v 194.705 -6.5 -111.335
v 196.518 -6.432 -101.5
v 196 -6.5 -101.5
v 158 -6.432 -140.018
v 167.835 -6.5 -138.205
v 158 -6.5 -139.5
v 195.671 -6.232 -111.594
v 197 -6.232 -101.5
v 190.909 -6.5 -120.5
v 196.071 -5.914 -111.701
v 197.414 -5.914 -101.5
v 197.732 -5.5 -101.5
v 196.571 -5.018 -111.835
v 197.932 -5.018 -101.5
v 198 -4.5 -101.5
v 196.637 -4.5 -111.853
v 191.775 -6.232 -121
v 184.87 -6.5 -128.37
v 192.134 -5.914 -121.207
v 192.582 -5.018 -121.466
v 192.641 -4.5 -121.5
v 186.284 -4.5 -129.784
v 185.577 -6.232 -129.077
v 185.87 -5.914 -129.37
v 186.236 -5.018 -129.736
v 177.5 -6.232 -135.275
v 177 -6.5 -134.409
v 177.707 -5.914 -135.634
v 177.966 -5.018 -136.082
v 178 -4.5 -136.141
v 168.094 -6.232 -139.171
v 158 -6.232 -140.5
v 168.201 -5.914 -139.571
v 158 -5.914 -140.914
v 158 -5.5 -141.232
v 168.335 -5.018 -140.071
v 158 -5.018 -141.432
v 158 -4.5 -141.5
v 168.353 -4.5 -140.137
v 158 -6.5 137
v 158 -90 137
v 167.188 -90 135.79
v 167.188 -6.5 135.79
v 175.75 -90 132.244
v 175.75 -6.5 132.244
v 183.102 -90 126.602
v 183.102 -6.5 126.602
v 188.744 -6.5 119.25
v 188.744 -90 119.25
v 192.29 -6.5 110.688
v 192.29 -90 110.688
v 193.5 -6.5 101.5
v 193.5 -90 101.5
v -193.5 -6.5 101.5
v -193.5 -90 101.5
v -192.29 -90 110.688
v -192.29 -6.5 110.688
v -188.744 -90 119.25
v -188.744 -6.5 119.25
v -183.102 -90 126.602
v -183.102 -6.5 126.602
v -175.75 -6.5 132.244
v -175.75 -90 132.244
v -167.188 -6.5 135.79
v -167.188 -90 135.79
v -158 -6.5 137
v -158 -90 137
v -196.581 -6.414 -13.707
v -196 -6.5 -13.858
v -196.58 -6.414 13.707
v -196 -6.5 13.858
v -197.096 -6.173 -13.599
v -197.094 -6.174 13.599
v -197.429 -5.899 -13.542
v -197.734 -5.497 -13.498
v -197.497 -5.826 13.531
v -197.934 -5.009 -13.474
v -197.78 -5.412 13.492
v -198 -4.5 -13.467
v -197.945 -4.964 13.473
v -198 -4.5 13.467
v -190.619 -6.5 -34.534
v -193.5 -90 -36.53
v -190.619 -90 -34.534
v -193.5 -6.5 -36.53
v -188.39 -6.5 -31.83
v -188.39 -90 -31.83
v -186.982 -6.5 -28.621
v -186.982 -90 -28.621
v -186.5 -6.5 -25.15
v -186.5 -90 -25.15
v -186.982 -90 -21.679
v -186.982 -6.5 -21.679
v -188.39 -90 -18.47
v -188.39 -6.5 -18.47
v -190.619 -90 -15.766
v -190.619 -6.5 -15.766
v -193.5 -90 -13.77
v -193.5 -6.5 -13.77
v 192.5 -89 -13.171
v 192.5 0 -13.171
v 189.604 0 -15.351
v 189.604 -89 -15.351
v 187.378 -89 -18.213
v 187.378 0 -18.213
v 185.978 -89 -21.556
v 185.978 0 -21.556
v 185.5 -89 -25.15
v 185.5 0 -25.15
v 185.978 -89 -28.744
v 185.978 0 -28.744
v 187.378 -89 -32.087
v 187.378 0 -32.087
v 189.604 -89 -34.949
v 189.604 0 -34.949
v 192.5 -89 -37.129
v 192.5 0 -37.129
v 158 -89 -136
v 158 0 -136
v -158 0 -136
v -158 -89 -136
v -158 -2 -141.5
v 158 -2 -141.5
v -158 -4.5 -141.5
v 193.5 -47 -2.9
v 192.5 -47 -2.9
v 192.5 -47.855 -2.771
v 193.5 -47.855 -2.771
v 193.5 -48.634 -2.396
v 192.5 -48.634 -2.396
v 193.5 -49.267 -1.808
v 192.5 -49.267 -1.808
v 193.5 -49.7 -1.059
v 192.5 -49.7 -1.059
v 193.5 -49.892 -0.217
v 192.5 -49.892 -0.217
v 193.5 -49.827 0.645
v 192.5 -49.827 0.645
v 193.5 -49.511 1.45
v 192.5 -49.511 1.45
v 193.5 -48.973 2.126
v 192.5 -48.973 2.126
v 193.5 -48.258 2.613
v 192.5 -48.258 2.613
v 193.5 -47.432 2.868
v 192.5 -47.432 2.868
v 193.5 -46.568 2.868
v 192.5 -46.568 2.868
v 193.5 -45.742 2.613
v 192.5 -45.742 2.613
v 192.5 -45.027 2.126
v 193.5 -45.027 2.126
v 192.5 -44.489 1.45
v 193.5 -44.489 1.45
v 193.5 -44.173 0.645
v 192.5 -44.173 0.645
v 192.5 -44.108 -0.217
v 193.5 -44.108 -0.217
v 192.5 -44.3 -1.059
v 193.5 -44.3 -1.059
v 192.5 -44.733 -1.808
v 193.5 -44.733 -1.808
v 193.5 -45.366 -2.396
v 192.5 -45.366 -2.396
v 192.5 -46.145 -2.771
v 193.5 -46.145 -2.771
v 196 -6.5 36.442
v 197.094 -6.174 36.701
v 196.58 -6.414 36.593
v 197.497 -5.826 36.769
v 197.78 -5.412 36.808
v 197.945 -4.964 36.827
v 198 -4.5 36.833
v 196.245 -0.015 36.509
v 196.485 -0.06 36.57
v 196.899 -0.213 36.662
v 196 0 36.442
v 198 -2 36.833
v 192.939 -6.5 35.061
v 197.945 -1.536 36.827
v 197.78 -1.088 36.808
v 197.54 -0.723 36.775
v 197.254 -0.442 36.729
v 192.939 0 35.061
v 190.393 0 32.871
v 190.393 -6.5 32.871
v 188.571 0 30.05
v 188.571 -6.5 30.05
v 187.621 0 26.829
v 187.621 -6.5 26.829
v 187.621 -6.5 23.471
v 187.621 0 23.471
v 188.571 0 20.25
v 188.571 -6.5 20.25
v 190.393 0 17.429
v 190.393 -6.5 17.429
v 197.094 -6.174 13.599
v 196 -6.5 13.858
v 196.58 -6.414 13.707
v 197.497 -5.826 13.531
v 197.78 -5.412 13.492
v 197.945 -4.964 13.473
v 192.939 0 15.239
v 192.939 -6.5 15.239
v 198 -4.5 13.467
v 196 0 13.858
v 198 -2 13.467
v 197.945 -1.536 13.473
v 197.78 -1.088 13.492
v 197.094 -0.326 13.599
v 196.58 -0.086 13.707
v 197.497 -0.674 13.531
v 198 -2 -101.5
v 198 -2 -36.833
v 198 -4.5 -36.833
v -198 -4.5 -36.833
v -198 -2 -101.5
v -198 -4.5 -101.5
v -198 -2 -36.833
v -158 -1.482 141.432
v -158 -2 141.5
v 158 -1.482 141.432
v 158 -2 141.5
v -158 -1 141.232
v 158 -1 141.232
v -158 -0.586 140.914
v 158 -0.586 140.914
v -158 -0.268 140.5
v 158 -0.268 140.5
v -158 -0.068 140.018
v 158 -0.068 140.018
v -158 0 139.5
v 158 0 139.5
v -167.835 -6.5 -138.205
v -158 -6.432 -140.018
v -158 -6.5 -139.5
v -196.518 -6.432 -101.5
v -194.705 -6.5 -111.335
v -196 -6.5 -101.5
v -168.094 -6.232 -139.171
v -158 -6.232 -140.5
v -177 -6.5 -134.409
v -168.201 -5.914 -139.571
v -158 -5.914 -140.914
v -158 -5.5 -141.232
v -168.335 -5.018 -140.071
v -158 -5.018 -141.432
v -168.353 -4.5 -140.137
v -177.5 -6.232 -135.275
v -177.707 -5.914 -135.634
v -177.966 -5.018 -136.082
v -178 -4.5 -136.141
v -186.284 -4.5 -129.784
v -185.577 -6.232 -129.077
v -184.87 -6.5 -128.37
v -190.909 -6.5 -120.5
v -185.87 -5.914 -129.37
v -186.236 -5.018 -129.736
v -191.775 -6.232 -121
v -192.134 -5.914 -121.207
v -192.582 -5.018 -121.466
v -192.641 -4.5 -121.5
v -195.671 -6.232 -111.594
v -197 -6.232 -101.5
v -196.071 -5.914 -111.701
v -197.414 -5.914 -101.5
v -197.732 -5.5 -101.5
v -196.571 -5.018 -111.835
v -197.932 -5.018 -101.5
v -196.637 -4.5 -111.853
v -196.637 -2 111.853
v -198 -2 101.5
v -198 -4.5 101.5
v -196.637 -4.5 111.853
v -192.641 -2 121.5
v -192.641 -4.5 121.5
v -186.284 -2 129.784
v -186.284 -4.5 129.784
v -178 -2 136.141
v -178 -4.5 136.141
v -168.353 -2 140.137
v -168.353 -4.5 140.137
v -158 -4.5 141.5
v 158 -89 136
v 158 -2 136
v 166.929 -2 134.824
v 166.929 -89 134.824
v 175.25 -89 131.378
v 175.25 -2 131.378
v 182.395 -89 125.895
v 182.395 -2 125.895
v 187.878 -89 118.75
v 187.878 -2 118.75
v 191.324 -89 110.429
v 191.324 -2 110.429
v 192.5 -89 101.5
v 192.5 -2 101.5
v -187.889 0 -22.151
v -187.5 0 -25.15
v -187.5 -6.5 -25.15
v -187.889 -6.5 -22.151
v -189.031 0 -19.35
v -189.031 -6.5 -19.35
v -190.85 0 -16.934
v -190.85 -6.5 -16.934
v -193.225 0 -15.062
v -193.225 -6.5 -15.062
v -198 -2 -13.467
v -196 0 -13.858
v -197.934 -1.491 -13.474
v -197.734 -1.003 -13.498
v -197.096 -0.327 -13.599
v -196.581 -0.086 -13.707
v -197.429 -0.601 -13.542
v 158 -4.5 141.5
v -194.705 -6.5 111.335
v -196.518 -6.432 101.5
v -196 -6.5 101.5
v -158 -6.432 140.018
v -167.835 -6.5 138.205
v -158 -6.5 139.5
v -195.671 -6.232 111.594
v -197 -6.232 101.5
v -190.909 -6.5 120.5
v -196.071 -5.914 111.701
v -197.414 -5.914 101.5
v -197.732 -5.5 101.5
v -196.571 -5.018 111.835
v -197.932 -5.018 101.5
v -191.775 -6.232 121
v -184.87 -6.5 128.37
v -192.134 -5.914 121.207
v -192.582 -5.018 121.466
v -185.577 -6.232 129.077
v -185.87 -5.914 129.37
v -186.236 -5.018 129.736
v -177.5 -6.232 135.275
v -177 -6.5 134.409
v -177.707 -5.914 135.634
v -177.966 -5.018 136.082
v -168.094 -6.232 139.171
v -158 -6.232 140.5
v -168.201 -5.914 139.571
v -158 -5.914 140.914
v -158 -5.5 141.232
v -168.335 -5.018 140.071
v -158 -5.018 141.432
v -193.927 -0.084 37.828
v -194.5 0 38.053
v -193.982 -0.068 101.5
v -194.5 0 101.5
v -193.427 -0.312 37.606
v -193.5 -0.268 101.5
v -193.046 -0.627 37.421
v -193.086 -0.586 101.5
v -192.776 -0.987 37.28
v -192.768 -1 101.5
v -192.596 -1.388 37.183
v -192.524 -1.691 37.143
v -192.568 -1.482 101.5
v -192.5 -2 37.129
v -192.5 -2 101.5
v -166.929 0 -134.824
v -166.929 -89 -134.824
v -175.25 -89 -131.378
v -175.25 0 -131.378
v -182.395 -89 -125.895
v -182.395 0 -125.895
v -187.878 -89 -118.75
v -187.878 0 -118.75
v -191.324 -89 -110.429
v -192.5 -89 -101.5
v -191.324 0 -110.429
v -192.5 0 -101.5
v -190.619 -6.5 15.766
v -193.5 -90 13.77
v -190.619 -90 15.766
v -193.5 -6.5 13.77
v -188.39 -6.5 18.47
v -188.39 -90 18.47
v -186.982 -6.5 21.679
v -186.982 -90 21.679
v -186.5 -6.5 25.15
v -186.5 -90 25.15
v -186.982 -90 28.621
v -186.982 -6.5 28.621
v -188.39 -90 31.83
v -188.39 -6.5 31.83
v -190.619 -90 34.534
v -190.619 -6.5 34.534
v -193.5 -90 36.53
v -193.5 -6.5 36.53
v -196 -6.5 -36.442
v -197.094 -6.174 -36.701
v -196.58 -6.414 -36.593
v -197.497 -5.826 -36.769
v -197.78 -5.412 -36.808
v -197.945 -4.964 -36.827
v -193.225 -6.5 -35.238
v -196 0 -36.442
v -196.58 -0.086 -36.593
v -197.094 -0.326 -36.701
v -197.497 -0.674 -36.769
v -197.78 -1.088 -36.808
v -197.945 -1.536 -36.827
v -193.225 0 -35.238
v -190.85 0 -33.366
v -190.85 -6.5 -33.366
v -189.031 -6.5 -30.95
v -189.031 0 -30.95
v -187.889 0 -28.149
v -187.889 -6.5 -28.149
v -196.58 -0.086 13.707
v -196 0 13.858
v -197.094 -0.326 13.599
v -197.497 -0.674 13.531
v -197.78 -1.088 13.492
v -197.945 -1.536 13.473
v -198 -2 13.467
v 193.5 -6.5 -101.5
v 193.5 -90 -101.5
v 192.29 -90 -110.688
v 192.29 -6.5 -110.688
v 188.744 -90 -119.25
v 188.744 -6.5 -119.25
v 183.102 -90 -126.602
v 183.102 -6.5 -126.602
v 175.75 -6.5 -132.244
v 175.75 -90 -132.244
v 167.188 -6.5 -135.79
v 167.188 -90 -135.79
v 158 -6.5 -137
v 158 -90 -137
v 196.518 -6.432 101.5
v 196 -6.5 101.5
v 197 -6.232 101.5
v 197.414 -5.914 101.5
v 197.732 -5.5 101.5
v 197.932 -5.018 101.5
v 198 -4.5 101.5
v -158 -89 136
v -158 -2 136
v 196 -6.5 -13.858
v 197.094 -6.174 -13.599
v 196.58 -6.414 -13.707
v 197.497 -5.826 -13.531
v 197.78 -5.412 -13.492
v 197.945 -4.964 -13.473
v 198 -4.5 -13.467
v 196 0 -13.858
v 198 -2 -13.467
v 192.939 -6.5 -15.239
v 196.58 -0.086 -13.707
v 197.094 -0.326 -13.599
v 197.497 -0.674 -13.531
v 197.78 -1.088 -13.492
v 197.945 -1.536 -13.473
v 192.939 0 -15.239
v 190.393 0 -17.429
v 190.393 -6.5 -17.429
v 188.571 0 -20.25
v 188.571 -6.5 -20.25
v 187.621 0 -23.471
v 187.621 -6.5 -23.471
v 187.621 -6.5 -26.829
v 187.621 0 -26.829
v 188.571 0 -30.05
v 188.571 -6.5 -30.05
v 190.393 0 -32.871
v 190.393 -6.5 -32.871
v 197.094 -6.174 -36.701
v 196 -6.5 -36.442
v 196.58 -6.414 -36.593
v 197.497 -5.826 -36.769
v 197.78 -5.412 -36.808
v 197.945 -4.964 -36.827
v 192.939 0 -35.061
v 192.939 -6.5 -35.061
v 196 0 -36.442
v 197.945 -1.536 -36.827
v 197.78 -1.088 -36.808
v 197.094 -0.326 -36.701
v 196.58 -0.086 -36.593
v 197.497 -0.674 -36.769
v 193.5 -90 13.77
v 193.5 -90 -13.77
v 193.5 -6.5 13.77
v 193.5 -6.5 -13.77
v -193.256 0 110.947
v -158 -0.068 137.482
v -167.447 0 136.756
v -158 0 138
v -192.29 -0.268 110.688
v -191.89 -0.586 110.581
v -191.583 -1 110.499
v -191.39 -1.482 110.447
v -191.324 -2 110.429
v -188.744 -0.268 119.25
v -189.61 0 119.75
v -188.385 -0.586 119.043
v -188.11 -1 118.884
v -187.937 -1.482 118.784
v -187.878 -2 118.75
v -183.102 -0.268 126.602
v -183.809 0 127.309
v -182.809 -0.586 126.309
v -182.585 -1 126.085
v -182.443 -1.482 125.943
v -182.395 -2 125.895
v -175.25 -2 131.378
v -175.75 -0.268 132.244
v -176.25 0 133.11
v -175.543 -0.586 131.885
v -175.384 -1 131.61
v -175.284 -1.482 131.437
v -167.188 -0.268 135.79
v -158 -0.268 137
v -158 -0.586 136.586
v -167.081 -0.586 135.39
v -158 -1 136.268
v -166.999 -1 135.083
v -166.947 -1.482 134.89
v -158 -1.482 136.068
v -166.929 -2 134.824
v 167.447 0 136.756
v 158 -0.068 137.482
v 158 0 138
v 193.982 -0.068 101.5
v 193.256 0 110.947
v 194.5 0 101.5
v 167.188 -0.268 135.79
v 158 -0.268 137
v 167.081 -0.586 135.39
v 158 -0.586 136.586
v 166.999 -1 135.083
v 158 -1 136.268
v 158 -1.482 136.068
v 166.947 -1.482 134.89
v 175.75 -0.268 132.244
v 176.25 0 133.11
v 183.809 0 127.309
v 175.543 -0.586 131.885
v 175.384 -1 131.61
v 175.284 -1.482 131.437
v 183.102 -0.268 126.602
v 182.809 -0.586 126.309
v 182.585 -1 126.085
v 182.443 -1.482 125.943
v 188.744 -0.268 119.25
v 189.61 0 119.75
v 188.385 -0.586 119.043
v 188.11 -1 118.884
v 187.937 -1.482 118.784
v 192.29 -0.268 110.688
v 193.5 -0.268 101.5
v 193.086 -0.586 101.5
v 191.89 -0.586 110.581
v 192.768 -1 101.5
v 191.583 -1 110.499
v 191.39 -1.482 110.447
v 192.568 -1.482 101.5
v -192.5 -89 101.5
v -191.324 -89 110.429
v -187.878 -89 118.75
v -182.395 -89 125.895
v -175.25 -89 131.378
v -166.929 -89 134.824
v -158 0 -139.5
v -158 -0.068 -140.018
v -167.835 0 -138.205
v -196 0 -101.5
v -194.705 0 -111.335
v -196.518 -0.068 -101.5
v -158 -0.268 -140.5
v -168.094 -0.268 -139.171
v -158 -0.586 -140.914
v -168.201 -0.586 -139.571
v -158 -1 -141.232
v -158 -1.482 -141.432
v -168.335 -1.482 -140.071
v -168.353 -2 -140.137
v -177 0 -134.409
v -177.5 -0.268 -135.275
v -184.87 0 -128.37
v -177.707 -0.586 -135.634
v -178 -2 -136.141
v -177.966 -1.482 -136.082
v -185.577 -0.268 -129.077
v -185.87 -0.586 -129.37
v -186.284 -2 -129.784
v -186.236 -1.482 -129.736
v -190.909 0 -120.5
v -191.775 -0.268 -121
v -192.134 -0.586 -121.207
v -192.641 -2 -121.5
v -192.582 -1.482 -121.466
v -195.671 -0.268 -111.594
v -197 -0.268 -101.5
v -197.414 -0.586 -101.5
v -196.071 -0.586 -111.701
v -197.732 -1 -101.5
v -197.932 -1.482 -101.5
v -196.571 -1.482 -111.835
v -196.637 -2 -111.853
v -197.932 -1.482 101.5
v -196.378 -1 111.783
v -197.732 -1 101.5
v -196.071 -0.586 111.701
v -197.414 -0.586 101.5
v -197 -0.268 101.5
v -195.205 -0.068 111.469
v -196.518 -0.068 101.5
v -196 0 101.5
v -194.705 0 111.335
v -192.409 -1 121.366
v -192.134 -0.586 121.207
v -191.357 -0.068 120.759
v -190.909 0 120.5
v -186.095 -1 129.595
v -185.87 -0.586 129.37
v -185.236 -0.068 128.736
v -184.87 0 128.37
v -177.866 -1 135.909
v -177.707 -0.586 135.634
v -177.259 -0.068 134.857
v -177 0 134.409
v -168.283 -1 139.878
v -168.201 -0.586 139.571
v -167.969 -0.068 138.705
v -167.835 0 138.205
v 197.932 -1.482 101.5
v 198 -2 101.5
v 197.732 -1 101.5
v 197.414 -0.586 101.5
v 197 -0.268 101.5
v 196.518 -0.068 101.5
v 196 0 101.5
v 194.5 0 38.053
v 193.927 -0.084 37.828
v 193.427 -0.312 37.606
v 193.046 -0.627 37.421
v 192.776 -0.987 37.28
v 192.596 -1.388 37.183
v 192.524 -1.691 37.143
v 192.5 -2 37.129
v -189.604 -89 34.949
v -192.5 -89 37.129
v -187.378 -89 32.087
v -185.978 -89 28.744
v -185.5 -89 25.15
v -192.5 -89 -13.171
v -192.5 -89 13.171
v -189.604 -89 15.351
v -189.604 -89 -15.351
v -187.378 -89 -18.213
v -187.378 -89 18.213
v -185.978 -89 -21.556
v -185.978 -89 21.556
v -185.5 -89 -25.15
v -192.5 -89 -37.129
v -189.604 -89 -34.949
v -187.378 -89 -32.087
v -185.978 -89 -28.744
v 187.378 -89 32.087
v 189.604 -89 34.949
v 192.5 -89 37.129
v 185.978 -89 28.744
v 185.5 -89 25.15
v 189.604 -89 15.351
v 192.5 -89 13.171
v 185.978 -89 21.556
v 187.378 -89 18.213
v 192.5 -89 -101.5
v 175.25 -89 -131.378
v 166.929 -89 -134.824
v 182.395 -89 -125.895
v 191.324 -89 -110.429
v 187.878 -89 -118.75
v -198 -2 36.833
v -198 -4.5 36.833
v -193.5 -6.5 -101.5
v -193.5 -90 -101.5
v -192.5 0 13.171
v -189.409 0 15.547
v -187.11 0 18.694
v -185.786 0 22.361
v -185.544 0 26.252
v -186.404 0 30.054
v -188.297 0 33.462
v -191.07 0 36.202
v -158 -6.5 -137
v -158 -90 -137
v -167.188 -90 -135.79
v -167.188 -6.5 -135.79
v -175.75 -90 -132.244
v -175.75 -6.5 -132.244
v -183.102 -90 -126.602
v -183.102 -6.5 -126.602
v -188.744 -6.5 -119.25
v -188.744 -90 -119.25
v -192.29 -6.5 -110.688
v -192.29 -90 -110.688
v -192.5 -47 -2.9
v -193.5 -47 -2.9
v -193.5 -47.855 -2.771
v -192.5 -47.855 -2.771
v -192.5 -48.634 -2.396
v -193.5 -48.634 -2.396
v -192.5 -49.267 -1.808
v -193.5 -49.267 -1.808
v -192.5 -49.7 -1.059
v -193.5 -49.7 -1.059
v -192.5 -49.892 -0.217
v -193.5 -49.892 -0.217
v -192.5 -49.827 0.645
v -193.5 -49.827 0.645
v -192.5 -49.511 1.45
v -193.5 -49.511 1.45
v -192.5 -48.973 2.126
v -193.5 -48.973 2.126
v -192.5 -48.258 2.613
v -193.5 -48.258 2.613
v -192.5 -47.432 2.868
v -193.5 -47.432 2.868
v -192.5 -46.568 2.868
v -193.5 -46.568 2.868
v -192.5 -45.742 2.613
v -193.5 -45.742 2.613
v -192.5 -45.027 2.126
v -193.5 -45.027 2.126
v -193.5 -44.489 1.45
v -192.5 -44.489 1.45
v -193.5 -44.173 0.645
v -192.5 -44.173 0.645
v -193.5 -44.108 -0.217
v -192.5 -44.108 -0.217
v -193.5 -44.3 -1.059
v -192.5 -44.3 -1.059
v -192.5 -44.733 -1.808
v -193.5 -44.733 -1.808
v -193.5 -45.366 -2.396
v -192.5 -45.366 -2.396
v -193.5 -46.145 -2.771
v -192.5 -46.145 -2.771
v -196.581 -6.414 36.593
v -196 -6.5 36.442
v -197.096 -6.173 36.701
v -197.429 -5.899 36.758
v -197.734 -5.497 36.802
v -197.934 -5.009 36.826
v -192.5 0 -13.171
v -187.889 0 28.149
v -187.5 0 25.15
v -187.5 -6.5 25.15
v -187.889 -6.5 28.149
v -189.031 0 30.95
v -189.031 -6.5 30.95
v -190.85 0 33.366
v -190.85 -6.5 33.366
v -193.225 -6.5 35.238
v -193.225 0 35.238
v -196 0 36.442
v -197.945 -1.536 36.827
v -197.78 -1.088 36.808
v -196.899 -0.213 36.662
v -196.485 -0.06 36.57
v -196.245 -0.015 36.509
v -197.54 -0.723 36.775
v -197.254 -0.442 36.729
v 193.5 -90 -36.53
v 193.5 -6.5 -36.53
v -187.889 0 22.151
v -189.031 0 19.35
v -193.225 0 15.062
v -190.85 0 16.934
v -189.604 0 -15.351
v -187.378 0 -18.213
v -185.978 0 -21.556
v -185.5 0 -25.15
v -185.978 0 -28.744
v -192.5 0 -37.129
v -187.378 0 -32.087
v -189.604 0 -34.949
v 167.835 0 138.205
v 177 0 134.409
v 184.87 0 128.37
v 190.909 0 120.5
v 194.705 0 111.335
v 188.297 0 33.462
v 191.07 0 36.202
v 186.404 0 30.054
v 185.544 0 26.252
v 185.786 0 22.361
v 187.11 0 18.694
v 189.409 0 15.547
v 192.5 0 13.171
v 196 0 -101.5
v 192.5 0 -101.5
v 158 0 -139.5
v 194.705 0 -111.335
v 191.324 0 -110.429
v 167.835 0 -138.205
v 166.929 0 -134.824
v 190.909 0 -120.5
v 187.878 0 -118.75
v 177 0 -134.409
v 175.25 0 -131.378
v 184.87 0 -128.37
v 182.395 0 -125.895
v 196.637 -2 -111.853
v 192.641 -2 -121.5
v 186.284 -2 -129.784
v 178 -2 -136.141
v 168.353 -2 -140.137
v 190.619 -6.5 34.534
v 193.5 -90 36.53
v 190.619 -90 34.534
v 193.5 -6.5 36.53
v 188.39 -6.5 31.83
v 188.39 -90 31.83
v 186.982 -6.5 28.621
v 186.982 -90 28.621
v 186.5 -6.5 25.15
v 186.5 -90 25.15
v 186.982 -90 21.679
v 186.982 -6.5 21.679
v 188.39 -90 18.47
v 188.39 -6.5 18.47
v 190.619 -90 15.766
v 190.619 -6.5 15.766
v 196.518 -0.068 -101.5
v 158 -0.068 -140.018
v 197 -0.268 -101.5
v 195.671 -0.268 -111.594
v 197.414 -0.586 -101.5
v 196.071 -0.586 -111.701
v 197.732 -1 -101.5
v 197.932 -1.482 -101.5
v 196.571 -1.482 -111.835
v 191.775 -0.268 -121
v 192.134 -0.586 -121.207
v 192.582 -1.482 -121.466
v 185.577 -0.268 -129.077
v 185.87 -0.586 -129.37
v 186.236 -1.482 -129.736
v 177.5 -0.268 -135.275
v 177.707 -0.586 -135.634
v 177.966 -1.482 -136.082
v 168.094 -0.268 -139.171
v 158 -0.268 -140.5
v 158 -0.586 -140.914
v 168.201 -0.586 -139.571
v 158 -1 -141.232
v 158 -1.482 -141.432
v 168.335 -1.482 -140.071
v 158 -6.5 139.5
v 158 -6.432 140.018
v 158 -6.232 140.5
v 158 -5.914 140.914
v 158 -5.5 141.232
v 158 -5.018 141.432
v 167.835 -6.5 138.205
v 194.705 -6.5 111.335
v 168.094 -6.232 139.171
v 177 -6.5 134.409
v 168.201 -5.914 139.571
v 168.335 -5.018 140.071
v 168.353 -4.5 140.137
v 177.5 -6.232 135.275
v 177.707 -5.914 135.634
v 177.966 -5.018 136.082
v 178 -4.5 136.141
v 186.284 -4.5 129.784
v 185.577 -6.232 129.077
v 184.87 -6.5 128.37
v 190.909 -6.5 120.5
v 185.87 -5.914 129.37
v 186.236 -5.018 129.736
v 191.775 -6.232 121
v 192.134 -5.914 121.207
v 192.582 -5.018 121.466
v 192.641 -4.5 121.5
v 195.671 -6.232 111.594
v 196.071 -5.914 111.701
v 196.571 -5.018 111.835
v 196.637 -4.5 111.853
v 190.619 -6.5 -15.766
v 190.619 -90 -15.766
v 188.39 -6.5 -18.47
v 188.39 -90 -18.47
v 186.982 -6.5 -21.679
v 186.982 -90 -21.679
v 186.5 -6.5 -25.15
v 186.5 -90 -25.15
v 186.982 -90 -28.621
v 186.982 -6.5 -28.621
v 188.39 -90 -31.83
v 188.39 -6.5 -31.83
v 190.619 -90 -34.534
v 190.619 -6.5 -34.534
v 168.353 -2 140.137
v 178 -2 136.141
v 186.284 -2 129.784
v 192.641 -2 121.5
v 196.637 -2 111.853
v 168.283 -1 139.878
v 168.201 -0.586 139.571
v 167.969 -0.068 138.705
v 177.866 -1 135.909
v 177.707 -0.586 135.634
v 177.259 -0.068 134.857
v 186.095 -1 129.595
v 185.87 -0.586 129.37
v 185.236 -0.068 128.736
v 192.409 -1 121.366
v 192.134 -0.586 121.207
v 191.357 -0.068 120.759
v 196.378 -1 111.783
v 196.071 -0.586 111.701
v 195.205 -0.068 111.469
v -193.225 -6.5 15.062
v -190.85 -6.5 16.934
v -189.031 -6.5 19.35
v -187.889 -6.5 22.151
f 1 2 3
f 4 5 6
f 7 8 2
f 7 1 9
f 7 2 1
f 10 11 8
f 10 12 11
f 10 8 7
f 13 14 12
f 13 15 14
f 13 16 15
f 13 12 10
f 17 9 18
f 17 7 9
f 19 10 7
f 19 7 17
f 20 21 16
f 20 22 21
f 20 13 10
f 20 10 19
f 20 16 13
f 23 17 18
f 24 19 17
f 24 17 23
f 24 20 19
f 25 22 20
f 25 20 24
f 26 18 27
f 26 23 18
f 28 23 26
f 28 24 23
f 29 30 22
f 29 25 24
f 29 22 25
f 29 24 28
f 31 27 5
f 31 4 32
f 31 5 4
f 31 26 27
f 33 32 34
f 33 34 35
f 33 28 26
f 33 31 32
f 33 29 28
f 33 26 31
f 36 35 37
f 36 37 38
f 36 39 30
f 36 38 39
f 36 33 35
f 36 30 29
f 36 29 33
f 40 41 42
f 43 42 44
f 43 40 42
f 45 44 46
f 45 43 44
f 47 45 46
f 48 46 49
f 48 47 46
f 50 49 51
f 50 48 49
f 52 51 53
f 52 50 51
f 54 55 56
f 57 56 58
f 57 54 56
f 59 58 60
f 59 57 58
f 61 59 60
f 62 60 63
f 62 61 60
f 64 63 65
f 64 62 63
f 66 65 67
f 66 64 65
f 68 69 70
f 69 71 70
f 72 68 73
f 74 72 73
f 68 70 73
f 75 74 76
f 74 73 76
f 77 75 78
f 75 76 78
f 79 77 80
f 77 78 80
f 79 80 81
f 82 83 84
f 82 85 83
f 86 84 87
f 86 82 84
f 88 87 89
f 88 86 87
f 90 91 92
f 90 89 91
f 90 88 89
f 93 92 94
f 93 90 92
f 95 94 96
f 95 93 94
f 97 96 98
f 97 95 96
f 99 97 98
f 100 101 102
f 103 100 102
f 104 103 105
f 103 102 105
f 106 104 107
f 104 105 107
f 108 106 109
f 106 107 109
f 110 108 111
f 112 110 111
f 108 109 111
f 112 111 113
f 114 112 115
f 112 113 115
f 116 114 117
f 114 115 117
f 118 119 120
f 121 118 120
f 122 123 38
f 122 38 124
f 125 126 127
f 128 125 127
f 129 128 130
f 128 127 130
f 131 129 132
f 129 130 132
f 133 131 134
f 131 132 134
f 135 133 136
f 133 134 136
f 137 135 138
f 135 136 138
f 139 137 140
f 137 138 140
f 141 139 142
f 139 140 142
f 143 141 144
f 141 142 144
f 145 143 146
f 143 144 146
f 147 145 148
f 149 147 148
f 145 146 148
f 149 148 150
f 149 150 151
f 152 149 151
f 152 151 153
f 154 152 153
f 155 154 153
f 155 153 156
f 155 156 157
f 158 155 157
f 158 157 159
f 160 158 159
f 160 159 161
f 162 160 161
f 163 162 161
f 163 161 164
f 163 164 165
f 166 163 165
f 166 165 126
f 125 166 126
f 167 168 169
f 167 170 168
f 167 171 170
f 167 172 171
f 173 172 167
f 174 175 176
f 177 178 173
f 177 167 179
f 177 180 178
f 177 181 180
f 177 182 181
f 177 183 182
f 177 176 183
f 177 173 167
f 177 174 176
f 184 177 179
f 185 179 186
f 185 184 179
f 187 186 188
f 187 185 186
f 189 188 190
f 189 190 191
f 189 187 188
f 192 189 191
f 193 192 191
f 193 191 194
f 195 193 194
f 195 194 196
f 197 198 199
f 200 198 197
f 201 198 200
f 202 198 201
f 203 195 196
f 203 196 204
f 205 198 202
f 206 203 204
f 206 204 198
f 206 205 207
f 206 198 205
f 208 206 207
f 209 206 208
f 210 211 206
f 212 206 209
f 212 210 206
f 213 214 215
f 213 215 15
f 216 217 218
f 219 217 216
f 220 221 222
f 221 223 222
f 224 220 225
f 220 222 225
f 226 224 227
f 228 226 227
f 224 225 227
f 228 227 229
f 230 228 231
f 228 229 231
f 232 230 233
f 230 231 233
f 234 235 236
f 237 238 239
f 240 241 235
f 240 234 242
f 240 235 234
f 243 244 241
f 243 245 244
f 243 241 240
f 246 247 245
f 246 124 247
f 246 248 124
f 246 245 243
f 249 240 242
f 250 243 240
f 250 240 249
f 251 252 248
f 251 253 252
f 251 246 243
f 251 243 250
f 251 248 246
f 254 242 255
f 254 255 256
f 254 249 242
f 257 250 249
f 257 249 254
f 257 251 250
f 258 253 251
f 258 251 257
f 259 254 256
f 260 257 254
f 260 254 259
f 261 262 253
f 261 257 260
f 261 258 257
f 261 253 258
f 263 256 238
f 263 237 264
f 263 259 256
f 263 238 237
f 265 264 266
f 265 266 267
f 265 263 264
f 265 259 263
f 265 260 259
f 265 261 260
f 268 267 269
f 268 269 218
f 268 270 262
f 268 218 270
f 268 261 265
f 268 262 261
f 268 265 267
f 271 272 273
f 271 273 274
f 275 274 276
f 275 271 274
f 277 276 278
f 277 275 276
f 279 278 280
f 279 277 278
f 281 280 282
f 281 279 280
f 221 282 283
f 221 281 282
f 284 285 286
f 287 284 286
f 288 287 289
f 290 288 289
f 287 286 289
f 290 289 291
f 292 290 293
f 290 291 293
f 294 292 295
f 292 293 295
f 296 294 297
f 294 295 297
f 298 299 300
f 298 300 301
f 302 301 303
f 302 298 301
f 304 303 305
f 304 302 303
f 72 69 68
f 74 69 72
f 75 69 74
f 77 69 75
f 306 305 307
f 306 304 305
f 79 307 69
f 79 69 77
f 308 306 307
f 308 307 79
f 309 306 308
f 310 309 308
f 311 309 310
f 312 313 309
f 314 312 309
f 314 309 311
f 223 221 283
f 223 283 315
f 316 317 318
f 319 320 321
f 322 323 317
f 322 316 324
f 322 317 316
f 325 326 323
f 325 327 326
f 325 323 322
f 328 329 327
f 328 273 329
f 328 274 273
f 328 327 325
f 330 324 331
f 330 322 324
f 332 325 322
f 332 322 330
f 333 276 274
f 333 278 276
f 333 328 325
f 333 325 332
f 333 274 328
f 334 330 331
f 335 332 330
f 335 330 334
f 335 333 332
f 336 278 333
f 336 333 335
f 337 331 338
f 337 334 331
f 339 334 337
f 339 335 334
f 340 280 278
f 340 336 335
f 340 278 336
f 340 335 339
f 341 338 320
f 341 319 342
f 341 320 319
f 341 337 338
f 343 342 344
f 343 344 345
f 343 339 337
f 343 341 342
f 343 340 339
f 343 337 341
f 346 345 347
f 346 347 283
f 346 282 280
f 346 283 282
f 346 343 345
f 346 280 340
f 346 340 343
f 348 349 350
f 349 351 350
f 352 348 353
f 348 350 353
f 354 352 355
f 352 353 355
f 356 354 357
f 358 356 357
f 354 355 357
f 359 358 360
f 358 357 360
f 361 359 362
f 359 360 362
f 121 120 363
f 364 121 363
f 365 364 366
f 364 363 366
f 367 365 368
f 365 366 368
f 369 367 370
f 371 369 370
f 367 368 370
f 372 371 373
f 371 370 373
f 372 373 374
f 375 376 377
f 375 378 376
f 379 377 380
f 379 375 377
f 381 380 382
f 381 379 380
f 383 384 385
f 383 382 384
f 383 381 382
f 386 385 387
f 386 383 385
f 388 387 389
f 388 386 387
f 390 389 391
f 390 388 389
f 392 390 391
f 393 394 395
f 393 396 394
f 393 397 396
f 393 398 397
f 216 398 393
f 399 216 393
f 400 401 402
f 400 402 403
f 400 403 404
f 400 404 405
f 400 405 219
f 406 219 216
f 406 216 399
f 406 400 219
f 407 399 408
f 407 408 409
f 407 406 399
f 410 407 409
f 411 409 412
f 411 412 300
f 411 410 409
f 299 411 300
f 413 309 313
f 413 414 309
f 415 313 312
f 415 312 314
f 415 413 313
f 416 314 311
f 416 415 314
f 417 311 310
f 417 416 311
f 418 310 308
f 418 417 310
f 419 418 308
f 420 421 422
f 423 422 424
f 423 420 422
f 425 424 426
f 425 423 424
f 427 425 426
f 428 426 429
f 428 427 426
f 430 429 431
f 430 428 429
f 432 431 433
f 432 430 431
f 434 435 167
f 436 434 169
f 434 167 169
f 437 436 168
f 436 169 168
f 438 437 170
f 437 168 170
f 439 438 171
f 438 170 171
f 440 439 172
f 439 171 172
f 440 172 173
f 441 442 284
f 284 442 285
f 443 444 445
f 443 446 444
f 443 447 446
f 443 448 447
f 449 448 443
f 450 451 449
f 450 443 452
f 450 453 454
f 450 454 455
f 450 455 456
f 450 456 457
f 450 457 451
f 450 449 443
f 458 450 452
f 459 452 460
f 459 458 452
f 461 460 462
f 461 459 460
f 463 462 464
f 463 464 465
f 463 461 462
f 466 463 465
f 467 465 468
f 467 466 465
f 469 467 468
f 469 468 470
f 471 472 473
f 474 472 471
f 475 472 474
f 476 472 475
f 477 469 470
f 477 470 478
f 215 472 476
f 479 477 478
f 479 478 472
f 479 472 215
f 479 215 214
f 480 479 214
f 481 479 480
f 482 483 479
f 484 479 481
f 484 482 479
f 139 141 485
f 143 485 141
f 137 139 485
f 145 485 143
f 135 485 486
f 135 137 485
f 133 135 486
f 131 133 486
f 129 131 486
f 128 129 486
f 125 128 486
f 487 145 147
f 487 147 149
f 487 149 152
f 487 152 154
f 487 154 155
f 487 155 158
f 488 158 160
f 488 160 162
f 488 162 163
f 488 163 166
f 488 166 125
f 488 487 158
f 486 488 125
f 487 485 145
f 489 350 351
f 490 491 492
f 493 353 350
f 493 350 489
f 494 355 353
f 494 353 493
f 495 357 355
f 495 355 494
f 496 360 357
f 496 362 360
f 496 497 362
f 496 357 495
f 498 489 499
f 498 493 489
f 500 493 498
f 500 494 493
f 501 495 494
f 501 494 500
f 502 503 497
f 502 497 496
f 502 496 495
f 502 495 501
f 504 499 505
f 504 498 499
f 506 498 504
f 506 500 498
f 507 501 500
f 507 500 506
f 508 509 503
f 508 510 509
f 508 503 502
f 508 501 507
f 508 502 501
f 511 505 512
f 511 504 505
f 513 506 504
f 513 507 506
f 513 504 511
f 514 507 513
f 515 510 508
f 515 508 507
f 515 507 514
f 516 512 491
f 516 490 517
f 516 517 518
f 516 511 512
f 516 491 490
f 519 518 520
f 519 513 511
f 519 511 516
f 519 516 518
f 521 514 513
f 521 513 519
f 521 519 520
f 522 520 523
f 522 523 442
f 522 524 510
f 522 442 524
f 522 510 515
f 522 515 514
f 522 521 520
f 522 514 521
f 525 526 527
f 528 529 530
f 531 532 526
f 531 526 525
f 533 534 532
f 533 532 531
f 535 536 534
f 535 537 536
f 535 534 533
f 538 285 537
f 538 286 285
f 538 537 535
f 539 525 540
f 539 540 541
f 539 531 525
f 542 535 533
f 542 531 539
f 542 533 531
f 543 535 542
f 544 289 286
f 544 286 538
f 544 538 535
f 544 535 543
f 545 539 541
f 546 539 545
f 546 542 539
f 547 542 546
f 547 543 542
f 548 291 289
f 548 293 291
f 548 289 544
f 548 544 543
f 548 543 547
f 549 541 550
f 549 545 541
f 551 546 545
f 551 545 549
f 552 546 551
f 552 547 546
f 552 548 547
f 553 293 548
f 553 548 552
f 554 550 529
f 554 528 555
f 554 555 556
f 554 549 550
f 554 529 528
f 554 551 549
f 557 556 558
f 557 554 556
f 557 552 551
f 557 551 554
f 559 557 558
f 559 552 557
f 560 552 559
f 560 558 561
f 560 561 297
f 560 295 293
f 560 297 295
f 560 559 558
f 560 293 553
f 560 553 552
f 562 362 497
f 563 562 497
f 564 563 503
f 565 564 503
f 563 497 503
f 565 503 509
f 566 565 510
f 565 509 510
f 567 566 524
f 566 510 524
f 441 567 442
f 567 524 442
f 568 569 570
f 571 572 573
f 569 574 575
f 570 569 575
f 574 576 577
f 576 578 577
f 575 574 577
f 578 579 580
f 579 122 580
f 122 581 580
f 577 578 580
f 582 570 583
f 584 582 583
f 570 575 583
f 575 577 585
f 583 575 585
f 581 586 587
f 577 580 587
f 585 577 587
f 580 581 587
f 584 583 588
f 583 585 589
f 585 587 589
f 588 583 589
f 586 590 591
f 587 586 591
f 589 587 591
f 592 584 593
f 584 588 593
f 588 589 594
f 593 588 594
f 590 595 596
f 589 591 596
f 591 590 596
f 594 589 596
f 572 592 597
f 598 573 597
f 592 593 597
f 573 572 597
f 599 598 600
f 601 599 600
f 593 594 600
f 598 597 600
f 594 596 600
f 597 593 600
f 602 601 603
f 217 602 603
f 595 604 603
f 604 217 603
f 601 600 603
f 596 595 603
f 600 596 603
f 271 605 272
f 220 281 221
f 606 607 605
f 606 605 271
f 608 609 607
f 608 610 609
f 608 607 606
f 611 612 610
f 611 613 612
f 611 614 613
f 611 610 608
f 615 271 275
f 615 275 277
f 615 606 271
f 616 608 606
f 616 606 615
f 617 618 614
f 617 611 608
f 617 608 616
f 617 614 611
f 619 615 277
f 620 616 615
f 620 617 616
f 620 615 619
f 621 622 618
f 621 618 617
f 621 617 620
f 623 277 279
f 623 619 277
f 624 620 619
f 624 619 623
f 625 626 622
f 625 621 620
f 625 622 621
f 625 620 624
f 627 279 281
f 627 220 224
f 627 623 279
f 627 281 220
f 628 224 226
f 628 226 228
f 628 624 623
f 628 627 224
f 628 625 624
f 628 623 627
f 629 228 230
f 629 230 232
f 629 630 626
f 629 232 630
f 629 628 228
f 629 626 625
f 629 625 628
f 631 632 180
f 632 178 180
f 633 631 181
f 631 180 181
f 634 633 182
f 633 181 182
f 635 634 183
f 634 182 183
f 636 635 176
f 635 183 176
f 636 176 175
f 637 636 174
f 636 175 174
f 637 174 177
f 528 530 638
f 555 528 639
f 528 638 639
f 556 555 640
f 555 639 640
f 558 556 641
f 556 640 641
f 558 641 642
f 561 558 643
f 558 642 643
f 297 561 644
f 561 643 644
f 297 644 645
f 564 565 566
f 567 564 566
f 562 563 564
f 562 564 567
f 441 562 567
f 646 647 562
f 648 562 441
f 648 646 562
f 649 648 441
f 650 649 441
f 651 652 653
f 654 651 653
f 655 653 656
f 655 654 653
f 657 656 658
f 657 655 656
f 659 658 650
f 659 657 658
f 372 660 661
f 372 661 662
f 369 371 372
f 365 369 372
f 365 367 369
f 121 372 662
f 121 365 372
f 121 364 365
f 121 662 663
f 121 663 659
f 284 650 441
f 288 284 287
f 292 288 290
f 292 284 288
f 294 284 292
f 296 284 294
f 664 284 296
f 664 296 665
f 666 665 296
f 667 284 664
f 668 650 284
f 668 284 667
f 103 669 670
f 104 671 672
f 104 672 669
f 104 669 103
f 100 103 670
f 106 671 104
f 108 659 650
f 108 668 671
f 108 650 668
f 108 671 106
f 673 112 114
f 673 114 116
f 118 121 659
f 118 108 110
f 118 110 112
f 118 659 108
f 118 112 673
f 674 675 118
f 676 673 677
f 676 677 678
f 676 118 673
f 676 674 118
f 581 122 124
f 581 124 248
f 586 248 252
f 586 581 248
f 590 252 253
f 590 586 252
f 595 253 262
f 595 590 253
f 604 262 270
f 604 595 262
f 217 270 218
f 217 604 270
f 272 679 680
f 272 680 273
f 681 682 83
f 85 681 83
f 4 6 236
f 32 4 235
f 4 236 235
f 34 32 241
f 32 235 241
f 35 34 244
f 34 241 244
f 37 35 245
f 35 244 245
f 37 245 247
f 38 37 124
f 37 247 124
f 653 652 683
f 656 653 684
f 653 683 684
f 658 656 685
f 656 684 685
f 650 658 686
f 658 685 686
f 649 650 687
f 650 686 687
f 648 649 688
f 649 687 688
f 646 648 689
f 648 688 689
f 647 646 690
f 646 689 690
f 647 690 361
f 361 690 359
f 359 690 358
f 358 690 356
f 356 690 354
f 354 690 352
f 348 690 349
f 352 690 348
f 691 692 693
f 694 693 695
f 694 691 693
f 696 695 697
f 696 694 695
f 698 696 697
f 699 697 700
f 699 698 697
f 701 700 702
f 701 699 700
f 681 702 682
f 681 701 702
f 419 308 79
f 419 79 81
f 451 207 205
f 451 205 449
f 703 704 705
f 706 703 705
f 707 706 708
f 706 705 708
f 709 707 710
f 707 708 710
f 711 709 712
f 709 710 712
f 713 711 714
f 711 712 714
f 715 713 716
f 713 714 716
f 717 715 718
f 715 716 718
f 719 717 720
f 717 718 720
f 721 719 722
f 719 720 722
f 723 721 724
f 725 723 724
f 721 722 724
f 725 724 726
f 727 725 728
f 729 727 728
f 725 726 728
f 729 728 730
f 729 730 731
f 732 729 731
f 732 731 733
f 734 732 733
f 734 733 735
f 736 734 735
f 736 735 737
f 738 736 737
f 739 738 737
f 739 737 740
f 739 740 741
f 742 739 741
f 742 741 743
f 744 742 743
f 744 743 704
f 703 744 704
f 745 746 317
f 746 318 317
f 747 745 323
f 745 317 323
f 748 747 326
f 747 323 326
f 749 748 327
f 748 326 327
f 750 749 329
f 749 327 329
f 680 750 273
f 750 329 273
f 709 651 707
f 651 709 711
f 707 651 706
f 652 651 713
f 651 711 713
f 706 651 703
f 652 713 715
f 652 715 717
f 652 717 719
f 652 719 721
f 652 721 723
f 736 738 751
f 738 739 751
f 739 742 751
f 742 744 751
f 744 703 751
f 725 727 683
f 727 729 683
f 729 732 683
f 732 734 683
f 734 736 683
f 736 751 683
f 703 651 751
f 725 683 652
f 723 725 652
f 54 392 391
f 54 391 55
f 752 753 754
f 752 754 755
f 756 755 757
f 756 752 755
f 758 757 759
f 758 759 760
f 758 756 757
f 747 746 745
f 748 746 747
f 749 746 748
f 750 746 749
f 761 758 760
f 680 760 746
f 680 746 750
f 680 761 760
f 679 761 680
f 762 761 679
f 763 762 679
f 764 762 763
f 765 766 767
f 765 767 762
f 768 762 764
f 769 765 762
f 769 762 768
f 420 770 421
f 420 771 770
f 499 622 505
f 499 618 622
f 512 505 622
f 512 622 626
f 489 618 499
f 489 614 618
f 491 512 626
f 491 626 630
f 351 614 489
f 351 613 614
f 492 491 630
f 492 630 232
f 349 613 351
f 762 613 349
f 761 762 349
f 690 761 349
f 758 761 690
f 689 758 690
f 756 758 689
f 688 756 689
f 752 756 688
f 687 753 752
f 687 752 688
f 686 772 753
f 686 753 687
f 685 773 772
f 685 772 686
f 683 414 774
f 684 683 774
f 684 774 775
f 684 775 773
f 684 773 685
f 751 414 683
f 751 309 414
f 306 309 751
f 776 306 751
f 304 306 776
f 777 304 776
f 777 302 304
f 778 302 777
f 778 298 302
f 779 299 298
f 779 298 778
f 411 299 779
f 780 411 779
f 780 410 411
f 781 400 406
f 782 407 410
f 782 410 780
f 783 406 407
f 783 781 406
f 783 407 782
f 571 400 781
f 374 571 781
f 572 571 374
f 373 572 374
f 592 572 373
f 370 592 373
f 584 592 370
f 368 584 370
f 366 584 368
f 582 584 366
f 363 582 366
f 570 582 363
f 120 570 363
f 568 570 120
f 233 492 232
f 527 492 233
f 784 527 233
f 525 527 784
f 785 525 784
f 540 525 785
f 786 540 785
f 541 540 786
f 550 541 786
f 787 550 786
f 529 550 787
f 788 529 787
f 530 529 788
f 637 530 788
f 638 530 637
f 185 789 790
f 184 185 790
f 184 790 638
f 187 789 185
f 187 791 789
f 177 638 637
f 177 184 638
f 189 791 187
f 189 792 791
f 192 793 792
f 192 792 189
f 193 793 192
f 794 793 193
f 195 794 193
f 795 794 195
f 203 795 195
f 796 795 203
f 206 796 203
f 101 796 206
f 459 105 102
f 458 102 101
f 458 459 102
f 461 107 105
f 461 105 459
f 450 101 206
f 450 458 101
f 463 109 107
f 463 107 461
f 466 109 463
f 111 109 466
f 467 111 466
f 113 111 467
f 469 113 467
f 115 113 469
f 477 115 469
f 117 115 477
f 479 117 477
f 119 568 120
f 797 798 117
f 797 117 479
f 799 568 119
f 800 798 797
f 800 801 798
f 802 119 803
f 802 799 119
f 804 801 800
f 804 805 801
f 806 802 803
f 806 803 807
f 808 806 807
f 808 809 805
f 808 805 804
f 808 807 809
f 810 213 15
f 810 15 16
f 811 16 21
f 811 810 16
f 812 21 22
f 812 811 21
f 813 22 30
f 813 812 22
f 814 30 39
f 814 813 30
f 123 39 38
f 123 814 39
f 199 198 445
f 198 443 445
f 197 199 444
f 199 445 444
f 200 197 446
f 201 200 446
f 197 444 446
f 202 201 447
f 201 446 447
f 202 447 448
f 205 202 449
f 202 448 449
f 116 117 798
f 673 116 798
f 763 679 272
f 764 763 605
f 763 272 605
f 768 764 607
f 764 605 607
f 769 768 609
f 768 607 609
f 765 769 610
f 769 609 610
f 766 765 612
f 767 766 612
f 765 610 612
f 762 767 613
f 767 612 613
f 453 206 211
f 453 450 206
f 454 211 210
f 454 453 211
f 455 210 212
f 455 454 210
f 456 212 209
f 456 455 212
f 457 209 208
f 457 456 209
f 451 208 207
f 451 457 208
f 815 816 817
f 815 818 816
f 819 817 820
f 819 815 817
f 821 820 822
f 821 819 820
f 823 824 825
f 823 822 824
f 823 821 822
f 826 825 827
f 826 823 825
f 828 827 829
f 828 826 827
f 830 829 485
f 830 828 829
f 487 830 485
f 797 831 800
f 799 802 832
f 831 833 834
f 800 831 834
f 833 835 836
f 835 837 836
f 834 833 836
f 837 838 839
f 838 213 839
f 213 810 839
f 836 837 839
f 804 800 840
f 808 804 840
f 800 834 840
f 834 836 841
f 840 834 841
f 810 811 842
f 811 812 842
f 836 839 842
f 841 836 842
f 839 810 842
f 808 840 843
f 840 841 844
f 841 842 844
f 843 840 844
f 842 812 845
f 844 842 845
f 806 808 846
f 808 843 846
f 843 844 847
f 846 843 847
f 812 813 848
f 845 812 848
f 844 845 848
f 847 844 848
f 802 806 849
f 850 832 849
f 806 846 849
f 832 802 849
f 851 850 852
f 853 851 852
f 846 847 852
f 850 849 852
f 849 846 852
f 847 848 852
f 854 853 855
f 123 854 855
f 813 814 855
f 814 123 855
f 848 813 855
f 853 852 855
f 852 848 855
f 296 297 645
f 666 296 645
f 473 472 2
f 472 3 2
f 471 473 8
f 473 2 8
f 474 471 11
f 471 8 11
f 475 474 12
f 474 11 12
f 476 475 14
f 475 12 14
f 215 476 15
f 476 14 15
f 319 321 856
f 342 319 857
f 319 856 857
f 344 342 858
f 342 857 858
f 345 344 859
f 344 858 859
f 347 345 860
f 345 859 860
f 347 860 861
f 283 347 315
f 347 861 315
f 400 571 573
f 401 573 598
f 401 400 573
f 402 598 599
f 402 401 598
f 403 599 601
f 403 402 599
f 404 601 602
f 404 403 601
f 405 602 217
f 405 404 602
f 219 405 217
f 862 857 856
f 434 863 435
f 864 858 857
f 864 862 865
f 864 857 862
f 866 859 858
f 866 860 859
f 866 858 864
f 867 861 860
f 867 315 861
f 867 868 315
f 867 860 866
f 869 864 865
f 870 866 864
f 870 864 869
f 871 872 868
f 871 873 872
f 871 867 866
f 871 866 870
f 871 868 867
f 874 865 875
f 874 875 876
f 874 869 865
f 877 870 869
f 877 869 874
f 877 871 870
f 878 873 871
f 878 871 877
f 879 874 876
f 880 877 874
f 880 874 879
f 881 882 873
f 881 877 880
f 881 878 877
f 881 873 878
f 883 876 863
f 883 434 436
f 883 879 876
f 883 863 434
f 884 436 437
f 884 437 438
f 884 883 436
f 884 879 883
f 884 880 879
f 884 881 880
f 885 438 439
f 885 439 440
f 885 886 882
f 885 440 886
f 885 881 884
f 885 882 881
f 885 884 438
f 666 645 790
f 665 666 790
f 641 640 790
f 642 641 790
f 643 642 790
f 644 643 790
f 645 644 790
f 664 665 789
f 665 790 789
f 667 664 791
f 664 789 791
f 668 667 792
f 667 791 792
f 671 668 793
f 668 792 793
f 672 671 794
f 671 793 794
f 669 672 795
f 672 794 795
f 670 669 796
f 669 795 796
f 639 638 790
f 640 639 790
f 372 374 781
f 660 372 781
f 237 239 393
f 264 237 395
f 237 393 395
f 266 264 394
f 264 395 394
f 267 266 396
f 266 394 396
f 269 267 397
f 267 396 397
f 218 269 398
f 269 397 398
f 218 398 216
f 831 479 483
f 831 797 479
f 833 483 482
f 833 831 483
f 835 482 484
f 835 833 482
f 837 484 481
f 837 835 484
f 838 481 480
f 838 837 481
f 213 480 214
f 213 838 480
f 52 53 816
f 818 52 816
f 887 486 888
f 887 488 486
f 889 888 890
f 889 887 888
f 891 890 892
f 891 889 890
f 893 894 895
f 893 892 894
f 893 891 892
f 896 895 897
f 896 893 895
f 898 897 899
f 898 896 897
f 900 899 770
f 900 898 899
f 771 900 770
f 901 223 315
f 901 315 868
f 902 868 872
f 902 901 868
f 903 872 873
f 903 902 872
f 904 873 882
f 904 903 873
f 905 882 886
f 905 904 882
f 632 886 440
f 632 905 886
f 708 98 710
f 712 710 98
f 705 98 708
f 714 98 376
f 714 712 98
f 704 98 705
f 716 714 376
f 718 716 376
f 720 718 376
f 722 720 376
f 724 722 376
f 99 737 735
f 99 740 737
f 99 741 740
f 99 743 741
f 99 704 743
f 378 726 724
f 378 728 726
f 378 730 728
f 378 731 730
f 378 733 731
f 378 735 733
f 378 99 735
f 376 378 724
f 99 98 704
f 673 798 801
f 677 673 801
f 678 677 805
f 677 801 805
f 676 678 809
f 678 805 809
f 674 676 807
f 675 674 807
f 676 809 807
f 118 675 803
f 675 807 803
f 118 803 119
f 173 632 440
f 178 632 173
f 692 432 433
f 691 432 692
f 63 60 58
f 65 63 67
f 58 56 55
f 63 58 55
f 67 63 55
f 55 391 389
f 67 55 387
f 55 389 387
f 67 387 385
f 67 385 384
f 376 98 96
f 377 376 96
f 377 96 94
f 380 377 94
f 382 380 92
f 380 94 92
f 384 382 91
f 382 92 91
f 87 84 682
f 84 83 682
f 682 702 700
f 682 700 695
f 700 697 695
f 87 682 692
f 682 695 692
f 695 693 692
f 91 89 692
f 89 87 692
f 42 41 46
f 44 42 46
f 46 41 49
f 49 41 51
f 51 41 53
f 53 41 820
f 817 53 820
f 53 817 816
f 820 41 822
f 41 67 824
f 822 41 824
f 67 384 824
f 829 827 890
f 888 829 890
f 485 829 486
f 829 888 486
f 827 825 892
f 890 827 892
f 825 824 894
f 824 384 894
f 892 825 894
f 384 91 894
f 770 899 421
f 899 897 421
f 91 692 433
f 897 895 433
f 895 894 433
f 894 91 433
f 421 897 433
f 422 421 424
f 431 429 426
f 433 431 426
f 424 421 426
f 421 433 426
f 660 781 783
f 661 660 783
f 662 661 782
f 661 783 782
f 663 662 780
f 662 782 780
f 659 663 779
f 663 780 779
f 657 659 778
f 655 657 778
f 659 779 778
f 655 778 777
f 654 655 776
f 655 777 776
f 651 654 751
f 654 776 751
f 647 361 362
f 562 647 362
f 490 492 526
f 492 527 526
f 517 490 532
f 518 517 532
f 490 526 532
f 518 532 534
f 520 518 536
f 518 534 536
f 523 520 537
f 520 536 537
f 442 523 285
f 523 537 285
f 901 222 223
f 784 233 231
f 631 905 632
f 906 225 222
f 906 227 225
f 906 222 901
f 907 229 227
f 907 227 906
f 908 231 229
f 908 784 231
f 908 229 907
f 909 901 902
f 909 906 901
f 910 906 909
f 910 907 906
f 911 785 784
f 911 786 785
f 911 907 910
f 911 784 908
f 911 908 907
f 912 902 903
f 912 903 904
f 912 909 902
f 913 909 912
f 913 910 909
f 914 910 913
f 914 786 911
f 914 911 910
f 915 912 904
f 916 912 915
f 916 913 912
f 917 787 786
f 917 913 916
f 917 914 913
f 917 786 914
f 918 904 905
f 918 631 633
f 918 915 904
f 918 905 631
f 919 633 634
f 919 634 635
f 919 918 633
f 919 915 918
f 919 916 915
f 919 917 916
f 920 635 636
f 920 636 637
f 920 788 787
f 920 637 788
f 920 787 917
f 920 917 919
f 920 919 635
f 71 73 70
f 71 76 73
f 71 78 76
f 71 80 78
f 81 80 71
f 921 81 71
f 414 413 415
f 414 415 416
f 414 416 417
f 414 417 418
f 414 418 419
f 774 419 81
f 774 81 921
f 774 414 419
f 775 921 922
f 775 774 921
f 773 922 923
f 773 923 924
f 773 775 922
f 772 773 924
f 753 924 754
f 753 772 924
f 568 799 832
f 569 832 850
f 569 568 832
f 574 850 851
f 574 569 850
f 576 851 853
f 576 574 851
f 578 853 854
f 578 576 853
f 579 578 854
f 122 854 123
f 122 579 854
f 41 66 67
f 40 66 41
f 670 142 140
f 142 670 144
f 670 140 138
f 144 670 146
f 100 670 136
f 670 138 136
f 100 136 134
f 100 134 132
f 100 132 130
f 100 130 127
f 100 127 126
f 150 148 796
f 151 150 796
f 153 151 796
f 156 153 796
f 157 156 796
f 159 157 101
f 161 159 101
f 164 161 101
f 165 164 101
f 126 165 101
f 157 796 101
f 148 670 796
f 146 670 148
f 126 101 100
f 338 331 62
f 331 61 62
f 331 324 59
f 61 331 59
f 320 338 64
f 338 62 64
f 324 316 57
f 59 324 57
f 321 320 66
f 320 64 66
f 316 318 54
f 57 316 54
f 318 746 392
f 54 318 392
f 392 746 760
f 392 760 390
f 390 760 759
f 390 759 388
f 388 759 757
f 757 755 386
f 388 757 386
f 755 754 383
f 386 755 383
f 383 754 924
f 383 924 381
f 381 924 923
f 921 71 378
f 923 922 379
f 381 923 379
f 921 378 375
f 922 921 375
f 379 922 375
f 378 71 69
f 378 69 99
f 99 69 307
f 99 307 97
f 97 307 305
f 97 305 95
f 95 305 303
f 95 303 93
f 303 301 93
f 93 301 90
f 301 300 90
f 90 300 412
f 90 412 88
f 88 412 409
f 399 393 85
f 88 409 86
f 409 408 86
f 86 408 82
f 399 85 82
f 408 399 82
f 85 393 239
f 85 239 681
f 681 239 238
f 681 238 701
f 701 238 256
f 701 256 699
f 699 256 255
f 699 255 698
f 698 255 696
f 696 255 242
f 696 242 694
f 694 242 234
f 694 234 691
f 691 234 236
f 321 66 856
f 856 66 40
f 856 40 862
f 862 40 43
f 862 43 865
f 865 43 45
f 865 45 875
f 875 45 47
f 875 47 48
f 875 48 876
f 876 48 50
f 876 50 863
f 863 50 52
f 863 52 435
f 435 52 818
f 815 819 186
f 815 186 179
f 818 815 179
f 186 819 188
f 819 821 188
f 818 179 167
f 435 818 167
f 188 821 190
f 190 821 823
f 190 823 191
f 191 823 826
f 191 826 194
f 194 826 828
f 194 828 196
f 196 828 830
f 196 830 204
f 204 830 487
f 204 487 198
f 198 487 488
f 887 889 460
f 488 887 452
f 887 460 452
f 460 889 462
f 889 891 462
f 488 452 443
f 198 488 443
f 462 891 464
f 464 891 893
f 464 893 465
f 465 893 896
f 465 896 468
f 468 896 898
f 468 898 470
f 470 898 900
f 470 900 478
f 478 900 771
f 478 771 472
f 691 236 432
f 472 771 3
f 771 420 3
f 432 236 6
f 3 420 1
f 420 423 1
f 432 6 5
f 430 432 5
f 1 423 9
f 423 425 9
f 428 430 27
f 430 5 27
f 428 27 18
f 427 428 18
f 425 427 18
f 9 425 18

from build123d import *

# Parameters (mm, degrees)
BOSS_EXTRUDE1_DEPTH = 89
SHELL1_T            = 1
BOSS_EXTRUDE2_DEPTH = 6.5
FILLET1_R           = 2
SKETCH3_R           = 2.9
CUT_EXTRUDE1_DEPTH  = 426.904332073


with BuildPart() as part:
    # Sketch1 → Boss-Extrude1 (new body)
    with BuildSketch(Plane(origin=(0, 0, 0), x_dir=(1, 0, 0), z_dir=(0, 1, 0))):
        with BuildLine():
            Line((-192.5, -37.129148551), (-192.5, -101.5))
            ThreePointArc((-192.5, -101.5), (-182.395183951, -125.895183951), (-158, -136))
            Line((-158, -136), (158, -136))
            ThreePointArc((158, -136), (182.395183951, -125.895183951), (192.5, -101.5))
            Line((192.5, -101.5), (192.5, -37.129148551))
            ThreePointArc((192.5, -37.129148551), (185.5, -25.15), (192.5, -13.170851449))
            Line((192.5, -13.170851449), (192.5, 13.170851449))
            ThreePointArc((192.5, 13.170851449), (185.5, 25.15), (192.5, 37.129148551))
            Line((192.5, 37.129148551), (192.5, 101.5))
            ThreePointArc((192.5, 101.5), (182.395183951, 125.895183951), (158, 136))
            Line((158, 136), (-158, 136))
            ThreePointArc((-158, 136), (-182.395183951, 125.895183951), (-192.5, 101.5))
            Line((-192.5, 101.5), (-192.5, 37.129148551))
            ThreePointArc((-192.5, 37.129148551), (-185.5, 25.15), (-192.5, 13.170851449))
            Line((-192.5, 13.170851449), (-192.5, -13.170851449))
            ThreePointArc((-192.5, -13.170851449), (-185.5, -25.15), (-192.5, -37.129148551))
        make_face()
    extrude(amount=-BOSS_EXTRUDE1_DEPTH)

    # Shell1
    shell1_openings = [part.faces().sort_by_distance(p)[0] for p in [
        (0, 0, 0),
    ]]
    offset(amount=SHELL1_T, openings=shell1_openings, kind=Kind.INTERSECTION)

    # Sketch2 → Boss-Extrude2 (add)
    with BuildSketch(Plane(origin=(0, 0, 0), x_dir=(1, 0, 0), z_dir=(0, 1, 0))):
        with BuildLine():
            Line((-198, -36.833321446), (-198, -101.5))
            ThreePointArc((-198, -101.5), (-186.284271247, -129.784271247), (-158, -141.5))
            Line((-158, -141.5), (158, -141.5))
            ThreePointArc((158, -141.5), (186.284271247, -129.784271247), (198, -101.5))
            Line((198, -101.5), (198, -36.833321446))
            ThreePointArc((198, -36.833321446), (187.5, -25.15), (198, -13.466678554))
            Line((198, -13.466678554), (198, 13.466678554))
            ThreePointArc((198, 13.466678554), (187.5, 25.15), (198, 36.833321446))
            Line((198, 36.833321446), (198, 101.5))
            ThreePointArc((198, 101.5), (186.284271247, 129.784271247), (158, 141.5))
            Line((158, 141.5), (-158, 141.5))
            ThreePointArc((-158, 141.5), (-186.284271247, 129.784271247), (-198, 101.5))
            Line((-198, 101.5), (-198, 36.833321446))
            ThreePointArc((-198, 36.833321446), (-190.510720854, 33.004139036), (-187.5, 25.15))
            ThreePointArc((-187.5, 25.15), (-190.510720854, 17.295860964), (-198, 13.466678554))
            Line((-198, 13.466678554), (-198, -13.466678554))
            ThreePointArc((-198, -13.466678554), (-190.510720854, -17.295860964), (-187.5, -25.15))
            ThreePointArc((-187.5, -25.15), (-190.510720854, -33.004139036), (-198, -36.833321446))
        make_face()
        with BuildLine():
            ThreePointArc((-193.5, 13.770193323), (-186.5, 25.15), (-193.5, 36.529806677))
            Line((-193.5, 36.529806677), (-193.5, 101.5))
            ThreePointArc((-193.5, 101.5), (-183.102290732, 126.602290732), (-158, 137))
            Line((-158, 137), (158, 137))
            ThreePointArc((158, 137), (183.102290732, 126.602290732), (193.5, 101.5))
            Line((193.5, 101.5), (193.5, 36.529806677))
            ThreePointArc((193.5, 36.529806677), (186.5, 25.15), (193.5, 13.770193323))
            Line((193.5, 13.770193323), (193.5, -13.770193323))
            ThreePointArc((193.5, -13.770193323), (186.5, -25.15), (193.5, -36.529806677))
            Line((193.5, -36.529806677), (193.5, -101.5))
            ThreePointArc((193.5, -101.5), (183.102290732, -126.602290732), (158, -137))
            Line((158, -137), (-158, -137))
            ThreePointArc((-158, -137), (-183.102290732, -126.602290732), (-193.5, -101.5))
            Line((-193.5, -101.5), (-193.5, -36.529806677))
            ThreePointArc((-193.5, -36.529806677), (-186.5, -25.15), (-193.5, -13.770193323))
            Line((-193.5, -13.770193323), (-193.5, 13.770193323))
        make_face(mode=Mode.SUBTRACT)
    extrude(amount=-BOSS_EXTRUDE2_DEPTH)

    # Fillet1
    fillet1_edges = [part.edges().sort_by_distance(p)[0] for p in [
        (198, -6.5, 0),
        (198, -6.5, 69.166660723),
        (186.284271247, -6.5, 129.784271247),
        (0, -6.5, 141.5),
        (-186.284271247, -6.5, 129.784271247),
        (-198, 0, 69.166660723),
        (-198, 0, 0),
        (-198, 0, -69.166660723),
        (-186.284271247, -6.5, -129.784271247),
        (0, 0, -141.5),
        (186.284271247, -6.5, -129.784271247),
        (198, -6.5, -69.166660723),
        (-198, -6.5, 69.166660723),
        (-198, -6.5, 0),
        (-198, -6.5, -69.166660723),
        (0, -6.5, -141.5),
        (198, 0, -69.166660723),
        (186.284271247, 0, -129.784271247),
        (-186.284271247, 0, -129.784271247),
        (-186.284271247, 0, 129.784271247),
        (0, 0, 141.5),
        (186.284271247, 0, 129.784271247),
        (198, 0, 69.166660723),
        (198, 0, 0),
        (-182.395183951, 0, 125.895183951),
        (-192.5, 0, 69.314574275),
        (0, 0, 136),
        (182.395183951, 0, 125.895183951),
        (192.5, 0, 69.314574275),
    ]]
    fillet(fillet1_edges, radius=FILLET1_R)

    # Sketch3 → Cut-Extrude1 (cut, through all)
    with BuildSketch(Plane.ZY.offset(193.5)):
        with Locations(Location((0, -47, 0), (0, 0, 180))):
            Circle(SKETCH3_R)
    extrude(amount=-CUT_EXTRUDE1_DEPTH, mode=Mode.SUBTRACT)


solid = part.part
